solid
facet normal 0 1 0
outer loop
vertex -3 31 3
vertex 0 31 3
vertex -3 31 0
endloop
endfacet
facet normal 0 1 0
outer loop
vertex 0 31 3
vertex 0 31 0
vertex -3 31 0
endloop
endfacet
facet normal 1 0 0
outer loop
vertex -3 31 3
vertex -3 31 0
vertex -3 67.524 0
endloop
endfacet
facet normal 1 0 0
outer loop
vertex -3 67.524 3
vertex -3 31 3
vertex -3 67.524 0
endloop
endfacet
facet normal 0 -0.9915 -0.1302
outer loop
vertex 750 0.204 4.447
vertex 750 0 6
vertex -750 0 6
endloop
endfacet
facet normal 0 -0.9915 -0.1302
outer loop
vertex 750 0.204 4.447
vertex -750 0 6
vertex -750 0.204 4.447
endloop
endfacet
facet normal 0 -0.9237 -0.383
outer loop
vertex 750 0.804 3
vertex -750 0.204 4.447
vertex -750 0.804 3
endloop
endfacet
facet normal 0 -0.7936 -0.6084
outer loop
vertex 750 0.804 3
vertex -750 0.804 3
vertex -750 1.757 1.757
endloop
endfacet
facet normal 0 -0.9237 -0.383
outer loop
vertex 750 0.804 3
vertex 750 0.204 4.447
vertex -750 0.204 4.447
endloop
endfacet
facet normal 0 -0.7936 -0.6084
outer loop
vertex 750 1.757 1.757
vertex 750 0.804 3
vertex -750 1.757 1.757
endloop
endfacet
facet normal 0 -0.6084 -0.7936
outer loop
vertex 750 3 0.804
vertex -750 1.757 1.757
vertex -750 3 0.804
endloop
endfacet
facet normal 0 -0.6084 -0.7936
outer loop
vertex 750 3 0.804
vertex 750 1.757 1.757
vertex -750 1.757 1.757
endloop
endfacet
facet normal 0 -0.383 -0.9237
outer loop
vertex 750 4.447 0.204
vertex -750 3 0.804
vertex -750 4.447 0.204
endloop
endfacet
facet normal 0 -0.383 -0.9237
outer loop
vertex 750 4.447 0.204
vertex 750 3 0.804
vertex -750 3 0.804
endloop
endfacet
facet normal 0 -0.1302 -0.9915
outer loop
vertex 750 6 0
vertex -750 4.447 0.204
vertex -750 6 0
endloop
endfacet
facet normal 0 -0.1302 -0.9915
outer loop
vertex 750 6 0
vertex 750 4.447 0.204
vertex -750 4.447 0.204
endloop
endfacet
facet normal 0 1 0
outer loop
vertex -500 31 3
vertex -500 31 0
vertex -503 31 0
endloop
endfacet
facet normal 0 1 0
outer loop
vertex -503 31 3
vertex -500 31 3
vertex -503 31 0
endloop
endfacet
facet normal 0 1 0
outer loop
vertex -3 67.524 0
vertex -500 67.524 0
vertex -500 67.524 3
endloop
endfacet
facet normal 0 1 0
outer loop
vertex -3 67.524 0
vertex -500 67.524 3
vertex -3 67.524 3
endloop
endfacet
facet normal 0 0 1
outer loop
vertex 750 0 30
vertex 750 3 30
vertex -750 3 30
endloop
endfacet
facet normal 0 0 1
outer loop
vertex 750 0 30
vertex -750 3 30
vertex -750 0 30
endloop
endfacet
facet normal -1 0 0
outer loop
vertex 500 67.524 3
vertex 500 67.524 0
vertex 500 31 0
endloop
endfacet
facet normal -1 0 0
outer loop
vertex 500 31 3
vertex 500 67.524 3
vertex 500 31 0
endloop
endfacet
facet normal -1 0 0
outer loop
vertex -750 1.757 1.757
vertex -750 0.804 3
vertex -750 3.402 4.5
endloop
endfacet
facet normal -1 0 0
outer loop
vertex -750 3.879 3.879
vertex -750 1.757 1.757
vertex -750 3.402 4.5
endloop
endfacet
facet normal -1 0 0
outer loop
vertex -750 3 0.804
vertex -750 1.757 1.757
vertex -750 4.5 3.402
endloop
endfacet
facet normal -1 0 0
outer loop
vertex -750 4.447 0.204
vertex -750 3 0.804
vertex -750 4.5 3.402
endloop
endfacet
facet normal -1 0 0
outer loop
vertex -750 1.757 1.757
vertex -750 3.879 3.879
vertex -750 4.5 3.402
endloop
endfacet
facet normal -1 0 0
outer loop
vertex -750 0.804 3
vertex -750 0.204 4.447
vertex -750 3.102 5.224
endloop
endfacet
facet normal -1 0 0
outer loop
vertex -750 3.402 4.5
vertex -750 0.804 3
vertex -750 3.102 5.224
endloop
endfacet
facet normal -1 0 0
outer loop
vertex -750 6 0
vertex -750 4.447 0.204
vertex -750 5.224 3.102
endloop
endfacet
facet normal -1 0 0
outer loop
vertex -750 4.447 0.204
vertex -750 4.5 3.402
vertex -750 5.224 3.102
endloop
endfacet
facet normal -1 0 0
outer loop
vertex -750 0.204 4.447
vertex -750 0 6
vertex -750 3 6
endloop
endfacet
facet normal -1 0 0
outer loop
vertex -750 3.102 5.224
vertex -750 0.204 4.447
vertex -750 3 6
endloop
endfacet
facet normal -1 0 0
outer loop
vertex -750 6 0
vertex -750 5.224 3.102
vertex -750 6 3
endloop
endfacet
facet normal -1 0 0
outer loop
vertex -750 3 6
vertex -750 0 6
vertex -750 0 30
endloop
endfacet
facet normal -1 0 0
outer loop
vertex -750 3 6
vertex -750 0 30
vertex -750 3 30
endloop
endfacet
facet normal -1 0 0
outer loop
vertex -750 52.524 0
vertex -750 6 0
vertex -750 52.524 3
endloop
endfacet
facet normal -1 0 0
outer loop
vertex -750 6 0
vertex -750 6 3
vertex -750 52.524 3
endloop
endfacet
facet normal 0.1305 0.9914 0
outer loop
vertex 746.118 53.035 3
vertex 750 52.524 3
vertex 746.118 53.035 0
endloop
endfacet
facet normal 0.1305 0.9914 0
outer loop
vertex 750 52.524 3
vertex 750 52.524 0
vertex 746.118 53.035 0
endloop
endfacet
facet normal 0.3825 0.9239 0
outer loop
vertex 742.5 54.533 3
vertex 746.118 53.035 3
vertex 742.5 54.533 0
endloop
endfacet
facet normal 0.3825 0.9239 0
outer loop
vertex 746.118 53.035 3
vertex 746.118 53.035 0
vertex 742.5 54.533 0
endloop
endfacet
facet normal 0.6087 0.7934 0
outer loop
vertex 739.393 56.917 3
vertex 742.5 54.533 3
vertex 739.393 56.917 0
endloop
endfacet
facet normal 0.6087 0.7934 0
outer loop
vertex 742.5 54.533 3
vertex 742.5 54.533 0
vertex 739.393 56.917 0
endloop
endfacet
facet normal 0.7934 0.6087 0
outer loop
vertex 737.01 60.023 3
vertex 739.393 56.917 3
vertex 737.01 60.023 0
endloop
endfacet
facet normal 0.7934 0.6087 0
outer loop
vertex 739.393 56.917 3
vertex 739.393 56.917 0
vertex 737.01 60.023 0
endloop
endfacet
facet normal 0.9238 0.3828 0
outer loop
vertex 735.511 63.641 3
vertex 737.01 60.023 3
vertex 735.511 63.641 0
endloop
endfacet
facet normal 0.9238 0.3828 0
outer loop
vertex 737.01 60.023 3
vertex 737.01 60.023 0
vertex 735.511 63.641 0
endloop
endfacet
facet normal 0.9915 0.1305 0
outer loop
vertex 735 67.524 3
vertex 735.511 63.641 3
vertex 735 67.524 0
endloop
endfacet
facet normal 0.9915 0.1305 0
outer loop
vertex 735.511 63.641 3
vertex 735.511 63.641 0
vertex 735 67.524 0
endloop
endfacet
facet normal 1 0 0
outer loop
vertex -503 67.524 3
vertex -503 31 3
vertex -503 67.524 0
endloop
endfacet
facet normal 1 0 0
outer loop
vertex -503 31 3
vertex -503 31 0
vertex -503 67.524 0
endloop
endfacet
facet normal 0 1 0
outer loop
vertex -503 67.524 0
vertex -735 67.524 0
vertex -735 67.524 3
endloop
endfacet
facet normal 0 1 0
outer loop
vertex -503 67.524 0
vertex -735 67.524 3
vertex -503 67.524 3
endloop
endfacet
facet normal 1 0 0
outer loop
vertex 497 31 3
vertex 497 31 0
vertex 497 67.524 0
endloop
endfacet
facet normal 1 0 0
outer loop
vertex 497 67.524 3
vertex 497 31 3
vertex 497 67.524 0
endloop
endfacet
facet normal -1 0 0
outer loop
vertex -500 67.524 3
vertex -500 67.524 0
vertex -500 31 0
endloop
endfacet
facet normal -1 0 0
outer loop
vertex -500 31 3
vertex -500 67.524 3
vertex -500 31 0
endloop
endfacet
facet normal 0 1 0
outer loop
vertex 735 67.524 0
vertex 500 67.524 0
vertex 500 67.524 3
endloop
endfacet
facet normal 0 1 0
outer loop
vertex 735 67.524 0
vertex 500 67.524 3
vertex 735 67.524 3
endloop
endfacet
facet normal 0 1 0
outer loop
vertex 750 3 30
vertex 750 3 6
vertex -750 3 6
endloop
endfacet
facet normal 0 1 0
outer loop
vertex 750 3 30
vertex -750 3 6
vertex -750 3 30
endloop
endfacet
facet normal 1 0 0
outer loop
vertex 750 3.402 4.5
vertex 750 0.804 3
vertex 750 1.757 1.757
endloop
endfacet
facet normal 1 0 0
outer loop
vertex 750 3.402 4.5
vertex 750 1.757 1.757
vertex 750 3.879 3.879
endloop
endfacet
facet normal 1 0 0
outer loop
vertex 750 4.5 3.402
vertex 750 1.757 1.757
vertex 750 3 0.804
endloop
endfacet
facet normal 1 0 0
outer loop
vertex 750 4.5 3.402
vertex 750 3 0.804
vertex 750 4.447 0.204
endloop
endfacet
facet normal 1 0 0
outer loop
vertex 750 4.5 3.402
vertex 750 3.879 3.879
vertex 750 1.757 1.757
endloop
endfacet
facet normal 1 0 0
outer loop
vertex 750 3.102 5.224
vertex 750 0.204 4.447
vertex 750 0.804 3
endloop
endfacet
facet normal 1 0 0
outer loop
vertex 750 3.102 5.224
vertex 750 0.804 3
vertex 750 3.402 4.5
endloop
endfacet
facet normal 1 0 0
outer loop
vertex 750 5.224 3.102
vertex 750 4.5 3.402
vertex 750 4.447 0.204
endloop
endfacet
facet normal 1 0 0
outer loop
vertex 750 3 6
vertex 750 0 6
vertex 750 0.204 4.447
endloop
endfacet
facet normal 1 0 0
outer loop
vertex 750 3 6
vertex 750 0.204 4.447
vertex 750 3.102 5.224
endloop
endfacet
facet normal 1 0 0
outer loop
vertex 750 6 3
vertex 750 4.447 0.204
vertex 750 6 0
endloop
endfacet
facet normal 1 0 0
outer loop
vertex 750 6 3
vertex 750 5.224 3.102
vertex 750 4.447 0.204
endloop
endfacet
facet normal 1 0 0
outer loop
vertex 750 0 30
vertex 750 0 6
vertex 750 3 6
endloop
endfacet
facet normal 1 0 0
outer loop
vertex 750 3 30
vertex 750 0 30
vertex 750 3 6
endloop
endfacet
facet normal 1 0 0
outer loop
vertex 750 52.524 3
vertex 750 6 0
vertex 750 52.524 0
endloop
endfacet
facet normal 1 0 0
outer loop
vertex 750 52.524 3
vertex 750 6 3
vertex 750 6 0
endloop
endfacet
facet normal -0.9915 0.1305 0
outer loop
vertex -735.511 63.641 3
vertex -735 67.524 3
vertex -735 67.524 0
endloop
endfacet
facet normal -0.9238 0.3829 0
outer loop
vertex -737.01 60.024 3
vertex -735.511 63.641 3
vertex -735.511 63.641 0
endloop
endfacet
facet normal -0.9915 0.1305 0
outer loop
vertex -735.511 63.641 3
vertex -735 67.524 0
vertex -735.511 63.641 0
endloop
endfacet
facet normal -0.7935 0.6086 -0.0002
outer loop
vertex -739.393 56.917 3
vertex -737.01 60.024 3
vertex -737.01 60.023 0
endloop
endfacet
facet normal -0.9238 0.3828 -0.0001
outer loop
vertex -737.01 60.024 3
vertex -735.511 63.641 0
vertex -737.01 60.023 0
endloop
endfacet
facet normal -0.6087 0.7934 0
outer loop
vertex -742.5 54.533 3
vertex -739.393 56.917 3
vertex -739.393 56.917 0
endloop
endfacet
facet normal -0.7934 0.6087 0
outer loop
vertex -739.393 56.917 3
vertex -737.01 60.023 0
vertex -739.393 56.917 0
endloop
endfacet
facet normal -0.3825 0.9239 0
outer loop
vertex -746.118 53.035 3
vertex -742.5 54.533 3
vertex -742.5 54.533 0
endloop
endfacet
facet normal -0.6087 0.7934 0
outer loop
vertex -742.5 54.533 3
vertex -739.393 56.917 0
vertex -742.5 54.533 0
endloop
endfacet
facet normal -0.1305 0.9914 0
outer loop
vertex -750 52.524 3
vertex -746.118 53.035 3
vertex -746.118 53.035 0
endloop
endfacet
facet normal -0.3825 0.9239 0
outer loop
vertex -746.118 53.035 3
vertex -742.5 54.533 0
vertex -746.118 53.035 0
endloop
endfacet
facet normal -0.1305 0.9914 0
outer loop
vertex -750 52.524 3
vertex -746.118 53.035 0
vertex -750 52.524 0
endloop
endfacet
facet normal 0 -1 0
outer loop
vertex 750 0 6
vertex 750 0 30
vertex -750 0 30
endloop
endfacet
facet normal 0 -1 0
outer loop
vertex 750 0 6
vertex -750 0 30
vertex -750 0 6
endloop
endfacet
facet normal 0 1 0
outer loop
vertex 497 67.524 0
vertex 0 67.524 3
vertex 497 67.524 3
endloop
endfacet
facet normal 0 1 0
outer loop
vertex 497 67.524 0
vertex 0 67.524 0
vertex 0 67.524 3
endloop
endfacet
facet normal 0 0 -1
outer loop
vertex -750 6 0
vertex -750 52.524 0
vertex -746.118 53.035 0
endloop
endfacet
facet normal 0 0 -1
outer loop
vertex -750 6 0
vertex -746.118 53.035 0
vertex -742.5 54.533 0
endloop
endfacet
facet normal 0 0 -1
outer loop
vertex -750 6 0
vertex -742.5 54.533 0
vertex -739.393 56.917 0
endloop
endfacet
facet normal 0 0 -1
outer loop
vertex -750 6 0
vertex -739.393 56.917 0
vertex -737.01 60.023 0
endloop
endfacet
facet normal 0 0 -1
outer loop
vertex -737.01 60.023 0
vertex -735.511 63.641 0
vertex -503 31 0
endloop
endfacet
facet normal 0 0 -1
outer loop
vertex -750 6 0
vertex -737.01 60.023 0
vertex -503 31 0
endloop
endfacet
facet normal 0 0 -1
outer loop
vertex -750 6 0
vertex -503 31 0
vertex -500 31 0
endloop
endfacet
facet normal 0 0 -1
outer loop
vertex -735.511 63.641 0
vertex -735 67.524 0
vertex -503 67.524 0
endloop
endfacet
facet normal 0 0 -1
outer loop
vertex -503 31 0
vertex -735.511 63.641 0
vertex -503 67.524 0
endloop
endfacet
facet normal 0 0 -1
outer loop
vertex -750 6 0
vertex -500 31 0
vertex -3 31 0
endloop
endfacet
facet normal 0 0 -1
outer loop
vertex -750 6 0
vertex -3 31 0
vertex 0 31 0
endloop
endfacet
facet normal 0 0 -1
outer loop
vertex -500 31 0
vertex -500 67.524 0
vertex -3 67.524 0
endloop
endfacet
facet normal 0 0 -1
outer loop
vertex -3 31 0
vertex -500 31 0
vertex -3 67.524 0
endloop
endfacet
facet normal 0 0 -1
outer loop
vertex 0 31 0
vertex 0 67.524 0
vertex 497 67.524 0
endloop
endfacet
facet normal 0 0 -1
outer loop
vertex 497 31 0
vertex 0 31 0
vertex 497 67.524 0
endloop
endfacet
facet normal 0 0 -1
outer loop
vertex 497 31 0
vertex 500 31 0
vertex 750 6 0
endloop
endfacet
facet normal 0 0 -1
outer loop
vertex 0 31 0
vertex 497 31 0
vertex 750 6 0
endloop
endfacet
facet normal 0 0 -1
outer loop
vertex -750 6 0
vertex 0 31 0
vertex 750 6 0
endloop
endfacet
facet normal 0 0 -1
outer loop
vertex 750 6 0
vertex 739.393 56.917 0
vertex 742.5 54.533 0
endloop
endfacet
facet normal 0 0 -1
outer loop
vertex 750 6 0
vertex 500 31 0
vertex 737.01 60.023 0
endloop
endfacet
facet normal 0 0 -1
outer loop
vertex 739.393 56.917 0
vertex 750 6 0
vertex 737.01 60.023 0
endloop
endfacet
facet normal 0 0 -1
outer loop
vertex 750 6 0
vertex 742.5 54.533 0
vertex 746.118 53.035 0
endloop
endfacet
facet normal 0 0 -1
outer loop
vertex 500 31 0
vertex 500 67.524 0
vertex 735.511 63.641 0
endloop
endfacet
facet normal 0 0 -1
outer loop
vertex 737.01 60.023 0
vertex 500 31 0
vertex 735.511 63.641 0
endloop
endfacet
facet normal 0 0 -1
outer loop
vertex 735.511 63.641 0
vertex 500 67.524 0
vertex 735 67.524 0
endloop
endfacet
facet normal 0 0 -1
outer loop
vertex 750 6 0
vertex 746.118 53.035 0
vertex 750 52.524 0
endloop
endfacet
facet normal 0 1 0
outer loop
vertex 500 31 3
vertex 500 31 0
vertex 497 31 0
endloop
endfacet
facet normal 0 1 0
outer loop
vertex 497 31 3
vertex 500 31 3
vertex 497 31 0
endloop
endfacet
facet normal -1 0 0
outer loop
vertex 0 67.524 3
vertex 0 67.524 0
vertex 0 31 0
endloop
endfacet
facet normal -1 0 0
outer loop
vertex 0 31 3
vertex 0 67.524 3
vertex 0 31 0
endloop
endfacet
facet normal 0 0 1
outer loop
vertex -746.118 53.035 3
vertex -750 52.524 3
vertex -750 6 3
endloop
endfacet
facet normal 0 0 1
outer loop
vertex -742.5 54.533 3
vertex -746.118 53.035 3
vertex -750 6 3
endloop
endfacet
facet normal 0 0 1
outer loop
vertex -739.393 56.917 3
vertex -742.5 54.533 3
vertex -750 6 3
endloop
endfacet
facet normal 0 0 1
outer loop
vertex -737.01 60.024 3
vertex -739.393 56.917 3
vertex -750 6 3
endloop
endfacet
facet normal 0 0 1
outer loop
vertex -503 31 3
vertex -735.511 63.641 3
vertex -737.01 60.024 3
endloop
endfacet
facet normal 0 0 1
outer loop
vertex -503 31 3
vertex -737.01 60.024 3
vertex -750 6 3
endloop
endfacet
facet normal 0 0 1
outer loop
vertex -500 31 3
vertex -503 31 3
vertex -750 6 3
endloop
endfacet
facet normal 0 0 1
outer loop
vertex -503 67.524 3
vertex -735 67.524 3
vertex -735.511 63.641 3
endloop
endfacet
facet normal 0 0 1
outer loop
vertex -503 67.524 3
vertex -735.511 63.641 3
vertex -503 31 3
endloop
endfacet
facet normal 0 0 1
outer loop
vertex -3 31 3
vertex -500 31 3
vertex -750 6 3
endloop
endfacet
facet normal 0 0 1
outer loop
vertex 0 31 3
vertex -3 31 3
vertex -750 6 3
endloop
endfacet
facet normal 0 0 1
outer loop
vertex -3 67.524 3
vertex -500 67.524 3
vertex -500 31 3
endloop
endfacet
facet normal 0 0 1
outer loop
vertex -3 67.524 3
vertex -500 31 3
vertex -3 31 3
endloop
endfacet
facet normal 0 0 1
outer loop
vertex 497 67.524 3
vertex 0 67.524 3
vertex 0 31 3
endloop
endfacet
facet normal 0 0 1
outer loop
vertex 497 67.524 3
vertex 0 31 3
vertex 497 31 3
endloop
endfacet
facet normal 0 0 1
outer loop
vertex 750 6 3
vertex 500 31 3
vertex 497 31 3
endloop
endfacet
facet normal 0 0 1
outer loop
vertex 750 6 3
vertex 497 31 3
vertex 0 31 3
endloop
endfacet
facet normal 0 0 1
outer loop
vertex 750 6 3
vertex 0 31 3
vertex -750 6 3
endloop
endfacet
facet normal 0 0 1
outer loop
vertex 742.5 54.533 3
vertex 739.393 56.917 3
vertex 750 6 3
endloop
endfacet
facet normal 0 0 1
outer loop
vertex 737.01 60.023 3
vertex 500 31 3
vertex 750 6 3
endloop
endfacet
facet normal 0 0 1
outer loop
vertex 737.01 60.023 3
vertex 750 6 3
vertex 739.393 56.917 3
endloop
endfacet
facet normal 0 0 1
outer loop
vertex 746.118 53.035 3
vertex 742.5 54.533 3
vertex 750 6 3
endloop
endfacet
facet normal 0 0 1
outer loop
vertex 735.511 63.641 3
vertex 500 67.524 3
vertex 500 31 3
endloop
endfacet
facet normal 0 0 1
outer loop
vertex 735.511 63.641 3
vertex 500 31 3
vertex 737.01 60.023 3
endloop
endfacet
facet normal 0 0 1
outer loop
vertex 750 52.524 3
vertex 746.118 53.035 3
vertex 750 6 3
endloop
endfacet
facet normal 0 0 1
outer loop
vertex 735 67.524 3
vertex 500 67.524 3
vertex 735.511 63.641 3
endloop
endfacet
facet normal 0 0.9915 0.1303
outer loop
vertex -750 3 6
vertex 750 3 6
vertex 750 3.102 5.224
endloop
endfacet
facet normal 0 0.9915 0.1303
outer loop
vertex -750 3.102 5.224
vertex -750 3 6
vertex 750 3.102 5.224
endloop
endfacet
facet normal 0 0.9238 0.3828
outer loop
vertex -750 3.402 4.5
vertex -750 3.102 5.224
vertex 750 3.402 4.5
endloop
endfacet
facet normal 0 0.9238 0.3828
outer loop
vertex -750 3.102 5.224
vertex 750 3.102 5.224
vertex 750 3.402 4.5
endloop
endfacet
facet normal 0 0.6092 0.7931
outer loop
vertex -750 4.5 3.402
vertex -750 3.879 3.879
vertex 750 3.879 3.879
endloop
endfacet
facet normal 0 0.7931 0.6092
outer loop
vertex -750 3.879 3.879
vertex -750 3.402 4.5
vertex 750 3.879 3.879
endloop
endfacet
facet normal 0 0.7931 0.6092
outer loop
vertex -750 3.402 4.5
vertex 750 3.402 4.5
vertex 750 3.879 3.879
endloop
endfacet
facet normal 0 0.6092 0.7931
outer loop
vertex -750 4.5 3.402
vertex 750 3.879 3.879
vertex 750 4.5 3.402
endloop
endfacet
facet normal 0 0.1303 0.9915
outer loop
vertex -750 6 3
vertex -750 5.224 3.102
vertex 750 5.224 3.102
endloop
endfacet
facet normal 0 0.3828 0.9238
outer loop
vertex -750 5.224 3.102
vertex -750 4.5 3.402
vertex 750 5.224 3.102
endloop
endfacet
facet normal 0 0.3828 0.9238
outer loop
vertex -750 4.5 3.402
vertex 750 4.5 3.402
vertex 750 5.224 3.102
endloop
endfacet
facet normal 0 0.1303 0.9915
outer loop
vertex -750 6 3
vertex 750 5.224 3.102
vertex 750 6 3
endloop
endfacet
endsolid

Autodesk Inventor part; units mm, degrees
ref_plane "YZ Plane" through (0, 0, 0) normal (1, 0, 0) x (0, 1, 0)
ref_plane "XZ Plane" through (0, 0, 0) normal (0, 1, 0) x (-1, 0, 0)
ref_plane "XY Plane" through (0, 0, 0) normal (0, 0, 1) x (1, 0, 0)
sketch "Sketch1" plane through (0, 0, 0) normal (0, 0, 1) x (1, 0, 0)
  line L0 (-750, 67.5235) -> (750, 67.5235)
  line L1 (750, 67.5235) -> (750, 0)
  line L2 (750, 0) -> (-750, 0)
  line L3 (-750, 0) -> (-750, 67.5235)
  point P0 (0, 0)
  point P1 (0, 0)
  dimension "d0" = 1500
  dimension "d1" = 67.5235
extrude "Plate1" add sketch "Sketch1" along normal blind 3
sketch "Sketch2" plane through (750, 3, 0) normal (0, -1, 0) x (1, 0, 0)
  line L0 (-1500, 0) -> (0, 0)
  line L1 (0, 0) -> (0, 30)
  line L2 (0, 30) -> (-1500, 30)
  line L3 (-1500, 30) -> (-1500, 0)
edge flange "Flange1" height 30 angle 90 thickness 3 bend radius 3 thickness toward (0, -1, 0) relief tear relief width 3 relief depth 1.5 edges at (0, 0, 3) wall of the first edge with corners at (-750, 3, 0) (750, 3, 0) (750, 3, 30) (-750, 3, 30)
bend "Bend1"
corner "Corner1"
sketch "Sketch5" plane through (0, 0, 0) normal (0, 0, -1) x (-1, 0, 0)
  line L0 (750, 67.5235) -> (-750, 67.5235) projected
  line L1 (500, 67.5235) -> (500, 31)
  line L2 (500, 31) -> (503, 31)
  line L3 (503, 31) -> (503, 67.5235)
  line L4 (750, 0) -> (-750, 0) projected
  point P0 (0, 0)
  dimension "d18" = 3
  dimension "d19" = 247
  dimension "d20" = 31
extrude "Extrusion1" cut sketch "Sketch5" against normal through all
pattern_linear "Rectangular Pattern1" count 3 spacing 500 along (1, 0, 0) of "Extrusion1"
sketch "Sketch6" plane through (0, 0, 0) normal (0, 0, -1) x (-1, 0, 0)
  line L0 (-750, 67.5235) -> (-750, 6) projected
  circle A0 centre (-750, 67.5235) radius 15
  line L1 (-750, 67.5235) -> (750, 67.5235) projected
  point P0 (0, 0)
  point P1 (-500, 67.5235)
  point P2 (-735, 67.5235)
  point P3 (-750, 52.5235)
  dimension "d24" = 30
extrude "Extrusion2" cut sketch "Sketch6" against normal through all contours L1 A0 L0 picked at (-740.1254, 66.4109)
mirror "Mirror1" about plane through (0, 0, 0) normal (1, 0, 0) of "Extrusion2"
equation "\"d1\" = Стрингер_3"
equation "\"d18\" = Thickness"
equation "\"d2\" = Thickness"
equation "\"d3\" = BendReliefWidth"
equation "\"d4\" = BendReliefDepth"
equation "\"d5\" = MinimumRemnant"
equation "\"d6\" = TransitionRadius"
equation "\"d9\" = BendRadius"
equation "\"d10\" = CornerReliefSize"
equation "\"d11\" = GapSize"
equation "\"d12\" = JacobiRadiusSize"
equation "\"BendRadius\" = Thickness"
equation "\"BendReliefWidth\" = Thickness"
equation "\"BendReliefDepth\" = 0.5 * Thickness"
equation "\"CornerReliefSize\" = 4 * Thickness"
equation "\"MinimumRemnant\" = 2 * Thickness"
equation "\"TransitionRadius\" = BendRadius"
equation "\"JacobiRadiusSize\" = BendRadius"
equation "\"GapSize\" = Thickness"
equation "\"Стрингер_3\" = 67.5235"
equation "\"Thickness\" = 3"
properties part number "МОО 053 стрингер борт 31"
